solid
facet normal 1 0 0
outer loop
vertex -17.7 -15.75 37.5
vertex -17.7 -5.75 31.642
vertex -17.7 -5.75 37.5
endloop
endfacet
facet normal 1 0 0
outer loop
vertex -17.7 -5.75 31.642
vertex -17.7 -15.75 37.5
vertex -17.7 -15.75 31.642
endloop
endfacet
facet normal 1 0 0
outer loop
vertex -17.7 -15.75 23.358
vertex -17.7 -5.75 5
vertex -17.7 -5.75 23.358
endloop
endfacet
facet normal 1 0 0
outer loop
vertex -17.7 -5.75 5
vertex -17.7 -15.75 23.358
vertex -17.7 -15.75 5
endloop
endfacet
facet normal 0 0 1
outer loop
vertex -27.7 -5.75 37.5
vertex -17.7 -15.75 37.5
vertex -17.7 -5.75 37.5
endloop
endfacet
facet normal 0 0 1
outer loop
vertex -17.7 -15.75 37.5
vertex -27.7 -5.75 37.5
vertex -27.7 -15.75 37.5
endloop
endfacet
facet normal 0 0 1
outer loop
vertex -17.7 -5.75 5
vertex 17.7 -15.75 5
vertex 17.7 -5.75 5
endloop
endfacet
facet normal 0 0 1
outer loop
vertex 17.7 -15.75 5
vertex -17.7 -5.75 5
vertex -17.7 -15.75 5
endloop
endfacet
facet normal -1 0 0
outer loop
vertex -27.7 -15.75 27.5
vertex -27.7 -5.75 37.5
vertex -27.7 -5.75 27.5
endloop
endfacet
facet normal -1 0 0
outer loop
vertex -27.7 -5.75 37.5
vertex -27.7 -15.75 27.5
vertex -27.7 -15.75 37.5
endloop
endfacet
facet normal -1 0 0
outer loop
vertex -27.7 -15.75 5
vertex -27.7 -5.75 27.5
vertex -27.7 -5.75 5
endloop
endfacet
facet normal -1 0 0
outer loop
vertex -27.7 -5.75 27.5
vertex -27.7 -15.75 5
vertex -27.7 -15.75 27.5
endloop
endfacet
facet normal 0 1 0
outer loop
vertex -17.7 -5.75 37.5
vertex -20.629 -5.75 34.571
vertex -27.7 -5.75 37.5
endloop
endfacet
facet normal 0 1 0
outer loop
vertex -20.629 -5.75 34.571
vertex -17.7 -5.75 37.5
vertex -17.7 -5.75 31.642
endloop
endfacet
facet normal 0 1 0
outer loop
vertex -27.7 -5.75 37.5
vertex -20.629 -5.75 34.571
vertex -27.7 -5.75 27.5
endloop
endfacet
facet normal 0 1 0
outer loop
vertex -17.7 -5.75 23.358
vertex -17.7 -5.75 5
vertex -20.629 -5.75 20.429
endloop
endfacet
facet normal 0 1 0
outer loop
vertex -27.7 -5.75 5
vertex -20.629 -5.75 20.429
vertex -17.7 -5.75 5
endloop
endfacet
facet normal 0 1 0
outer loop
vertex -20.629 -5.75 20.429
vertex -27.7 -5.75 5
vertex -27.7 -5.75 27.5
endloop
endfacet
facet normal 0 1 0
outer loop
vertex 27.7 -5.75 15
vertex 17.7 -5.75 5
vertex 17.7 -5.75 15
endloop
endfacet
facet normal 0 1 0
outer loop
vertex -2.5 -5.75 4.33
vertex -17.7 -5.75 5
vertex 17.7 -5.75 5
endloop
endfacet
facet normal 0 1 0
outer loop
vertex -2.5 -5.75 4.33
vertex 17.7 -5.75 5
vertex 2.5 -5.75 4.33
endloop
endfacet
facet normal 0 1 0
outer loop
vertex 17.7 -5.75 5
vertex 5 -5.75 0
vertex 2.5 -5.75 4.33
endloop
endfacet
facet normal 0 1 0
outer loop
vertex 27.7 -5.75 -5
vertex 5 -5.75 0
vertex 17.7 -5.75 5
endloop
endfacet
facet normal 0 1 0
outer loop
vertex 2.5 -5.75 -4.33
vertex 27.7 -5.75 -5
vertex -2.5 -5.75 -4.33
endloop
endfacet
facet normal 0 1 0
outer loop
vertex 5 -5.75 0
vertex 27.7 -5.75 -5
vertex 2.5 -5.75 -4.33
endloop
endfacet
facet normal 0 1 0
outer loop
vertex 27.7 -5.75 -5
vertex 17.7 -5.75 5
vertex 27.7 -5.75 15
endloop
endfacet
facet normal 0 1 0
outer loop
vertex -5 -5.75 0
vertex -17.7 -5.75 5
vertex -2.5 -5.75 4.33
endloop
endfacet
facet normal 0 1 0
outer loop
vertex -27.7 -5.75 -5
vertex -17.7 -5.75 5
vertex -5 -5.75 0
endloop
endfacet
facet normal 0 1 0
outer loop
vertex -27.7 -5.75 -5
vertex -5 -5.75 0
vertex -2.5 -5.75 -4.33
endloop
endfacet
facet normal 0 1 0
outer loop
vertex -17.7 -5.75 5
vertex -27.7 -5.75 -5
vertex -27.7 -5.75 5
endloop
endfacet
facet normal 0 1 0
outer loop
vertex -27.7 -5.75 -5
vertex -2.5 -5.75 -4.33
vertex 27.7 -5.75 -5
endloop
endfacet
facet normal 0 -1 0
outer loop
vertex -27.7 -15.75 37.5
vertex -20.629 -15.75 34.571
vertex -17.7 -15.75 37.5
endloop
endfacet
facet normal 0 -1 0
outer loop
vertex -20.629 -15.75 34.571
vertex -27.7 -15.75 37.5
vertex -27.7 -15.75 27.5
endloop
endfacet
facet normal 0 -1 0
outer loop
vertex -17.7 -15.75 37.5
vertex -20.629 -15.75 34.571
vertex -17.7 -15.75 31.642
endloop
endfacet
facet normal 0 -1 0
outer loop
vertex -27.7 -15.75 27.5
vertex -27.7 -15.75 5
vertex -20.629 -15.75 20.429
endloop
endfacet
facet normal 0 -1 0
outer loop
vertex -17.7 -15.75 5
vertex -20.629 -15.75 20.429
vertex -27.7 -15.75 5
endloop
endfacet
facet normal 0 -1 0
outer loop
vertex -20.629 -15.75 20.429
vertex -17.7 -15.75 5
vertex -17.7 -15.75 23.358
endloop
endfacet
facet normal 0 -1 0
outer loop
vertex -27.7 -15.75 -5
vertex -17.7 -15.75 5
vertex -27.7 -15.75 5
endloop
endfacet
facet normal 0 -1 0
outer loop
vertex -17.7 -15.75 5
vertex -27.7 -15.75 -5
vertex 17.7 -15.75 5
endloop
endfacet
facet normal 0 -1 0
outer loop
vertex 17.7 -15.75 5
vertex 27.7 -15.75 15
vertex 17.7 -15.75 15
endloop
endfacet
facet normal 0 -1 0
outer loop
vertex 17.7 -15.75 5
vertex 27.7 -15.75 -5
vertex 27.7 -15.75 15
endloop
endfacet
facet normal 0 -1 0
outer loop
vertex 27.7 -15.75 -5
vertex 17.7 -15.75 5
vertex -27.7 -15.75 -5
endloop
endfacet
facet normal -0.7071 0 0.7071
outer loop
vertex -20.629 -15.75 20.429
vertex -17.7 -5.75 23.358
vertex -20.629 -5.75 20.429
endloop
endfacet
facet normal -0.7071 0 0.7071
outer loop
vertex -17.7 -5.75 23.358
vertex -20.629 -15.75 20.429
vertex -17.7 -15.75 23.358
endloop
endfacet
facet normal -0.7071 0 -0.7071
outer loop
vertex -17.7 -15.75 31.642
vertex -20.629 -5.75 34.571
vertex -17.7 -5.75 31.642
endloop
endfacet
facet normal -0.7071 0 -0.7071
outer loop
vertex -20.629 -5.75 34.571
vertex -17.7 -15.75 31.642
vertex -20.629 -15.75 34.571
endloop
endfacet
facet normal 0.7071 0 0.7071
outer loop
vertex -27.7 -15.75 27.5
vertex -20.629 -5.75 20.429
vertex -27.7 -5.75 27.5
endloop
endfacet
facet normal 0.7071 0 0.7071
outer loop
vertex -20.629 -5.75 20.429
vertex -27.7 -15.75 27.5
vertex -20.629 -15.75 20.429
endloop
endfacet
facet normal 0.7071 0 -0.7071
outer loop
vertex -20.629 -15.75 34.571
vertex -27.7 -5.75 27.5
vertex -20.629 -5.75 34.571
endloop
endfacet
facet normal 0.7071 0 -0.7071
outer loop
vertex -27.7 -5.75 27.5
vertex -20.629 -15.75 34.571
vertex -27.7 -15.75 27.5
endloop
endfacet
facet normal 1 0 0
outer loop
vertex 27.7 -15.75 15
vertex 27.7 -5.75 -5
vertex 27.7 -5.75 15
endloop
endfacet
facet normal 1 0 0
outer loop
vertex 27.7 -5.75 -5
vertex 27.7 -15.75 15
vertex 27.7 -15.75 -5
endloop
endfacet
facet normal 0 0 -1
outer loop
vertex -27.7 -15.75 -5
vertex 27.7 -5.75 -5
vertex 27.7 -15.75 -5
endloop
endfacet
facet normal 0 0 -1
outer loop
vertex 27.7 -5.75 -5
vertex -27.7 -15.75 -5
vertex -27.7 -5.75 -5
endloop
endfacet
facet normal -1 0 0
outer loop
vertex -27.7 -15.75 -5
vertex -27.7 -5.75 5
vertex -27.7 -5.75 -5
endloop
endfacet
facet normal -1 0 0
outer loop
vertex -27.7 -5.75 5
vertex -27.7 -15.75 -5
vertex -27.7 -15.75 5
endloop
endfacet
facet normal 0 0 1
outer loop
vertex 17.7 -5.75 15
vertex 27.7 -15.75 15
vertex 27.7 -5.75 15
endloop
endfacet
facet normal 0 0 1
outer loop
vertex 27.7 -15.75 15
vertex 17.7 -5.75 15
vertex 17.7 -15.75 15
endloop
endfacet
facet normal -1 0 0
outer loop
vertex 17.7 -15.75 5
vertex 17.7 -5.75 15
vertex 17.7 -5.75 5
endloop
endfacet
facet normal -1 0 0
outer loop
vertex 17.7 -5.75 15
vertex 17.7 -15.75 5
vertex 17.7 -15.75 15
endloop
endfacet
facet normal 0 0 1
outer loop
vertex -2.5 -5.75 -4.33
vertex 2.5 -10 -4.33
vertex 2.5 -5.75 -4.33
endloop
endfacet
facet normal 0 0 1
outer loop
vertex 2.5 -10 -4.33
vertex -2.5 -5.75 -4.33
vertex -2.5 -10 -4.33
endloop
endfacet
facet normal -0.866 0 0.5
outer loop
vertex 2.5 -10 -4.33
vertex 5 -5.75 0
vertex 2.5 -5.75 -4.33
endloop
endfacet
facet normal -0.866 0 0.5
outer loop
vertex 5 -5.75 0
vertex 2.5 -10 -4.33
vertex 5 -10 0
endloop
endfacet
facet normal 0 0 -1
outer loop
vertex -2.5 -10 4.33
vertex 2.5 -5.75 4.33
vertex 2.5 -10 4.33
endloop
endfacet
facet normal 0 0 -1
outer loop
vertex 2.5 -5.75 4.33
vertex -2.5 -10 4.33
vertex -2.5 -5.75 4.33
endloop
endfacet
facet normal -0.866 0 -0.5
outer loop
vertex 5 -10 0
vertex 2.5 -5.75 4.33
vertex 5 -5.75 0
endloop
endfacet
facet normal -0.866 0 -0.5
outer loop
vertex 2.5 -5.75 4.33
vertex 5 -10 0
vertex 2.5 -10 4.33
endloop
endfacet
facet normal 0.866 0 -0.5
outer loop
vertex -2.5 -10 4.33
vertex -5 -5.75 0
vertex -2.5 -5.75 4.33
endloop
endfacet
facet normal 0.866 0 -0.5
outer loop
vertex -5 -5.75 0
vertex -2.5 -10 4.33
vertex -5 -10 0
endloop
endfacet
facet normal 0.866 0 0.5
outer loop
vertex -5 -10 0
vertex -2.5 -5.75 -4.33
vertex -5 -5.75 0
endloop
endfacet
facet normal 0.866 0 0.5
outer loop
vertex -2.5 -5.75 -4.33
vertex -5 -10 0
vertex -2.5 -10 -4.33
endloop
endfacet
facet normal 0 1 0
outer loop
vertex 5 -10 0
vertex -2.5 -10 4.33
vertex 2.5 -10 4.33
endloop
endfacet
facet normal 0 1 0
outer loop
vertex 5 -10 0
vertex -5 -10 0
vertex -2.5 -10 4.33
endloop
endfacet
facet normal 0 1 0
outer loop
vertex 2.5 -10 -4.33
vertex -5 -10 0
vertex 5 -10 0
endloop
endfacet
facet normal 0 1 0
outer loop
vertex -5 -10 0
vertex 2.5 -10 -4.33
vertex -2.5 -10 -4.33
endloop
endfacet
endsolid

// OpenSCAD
module bracket() {
    difference() {
        union() {
            // Horizontal beam
            translate([-27.7, -15.75, -5])
                cube([55.4, 10, 10]);

            // Tall vertical end plate with chamfer
            translate([-27.7, -15.75, 5])
                difference() {
                    cube([10, 10, 32.5]);
                    translate([0, 0, 22.5])
                        rotate([0, 45, 0])
                        cube([10, 10, 10]);
                }

            // Short vertical support/leg
            translate([17.7, -15.75, -5])
                cube([10, 10, 20]);
        }

        // Hexagonal hole in the horizontal beam
        translate([0, 0, 0])
            rotate([90, 0, 0])
            cylinder(h=10, r=5, $fn=6);
    }
}

bracket();
